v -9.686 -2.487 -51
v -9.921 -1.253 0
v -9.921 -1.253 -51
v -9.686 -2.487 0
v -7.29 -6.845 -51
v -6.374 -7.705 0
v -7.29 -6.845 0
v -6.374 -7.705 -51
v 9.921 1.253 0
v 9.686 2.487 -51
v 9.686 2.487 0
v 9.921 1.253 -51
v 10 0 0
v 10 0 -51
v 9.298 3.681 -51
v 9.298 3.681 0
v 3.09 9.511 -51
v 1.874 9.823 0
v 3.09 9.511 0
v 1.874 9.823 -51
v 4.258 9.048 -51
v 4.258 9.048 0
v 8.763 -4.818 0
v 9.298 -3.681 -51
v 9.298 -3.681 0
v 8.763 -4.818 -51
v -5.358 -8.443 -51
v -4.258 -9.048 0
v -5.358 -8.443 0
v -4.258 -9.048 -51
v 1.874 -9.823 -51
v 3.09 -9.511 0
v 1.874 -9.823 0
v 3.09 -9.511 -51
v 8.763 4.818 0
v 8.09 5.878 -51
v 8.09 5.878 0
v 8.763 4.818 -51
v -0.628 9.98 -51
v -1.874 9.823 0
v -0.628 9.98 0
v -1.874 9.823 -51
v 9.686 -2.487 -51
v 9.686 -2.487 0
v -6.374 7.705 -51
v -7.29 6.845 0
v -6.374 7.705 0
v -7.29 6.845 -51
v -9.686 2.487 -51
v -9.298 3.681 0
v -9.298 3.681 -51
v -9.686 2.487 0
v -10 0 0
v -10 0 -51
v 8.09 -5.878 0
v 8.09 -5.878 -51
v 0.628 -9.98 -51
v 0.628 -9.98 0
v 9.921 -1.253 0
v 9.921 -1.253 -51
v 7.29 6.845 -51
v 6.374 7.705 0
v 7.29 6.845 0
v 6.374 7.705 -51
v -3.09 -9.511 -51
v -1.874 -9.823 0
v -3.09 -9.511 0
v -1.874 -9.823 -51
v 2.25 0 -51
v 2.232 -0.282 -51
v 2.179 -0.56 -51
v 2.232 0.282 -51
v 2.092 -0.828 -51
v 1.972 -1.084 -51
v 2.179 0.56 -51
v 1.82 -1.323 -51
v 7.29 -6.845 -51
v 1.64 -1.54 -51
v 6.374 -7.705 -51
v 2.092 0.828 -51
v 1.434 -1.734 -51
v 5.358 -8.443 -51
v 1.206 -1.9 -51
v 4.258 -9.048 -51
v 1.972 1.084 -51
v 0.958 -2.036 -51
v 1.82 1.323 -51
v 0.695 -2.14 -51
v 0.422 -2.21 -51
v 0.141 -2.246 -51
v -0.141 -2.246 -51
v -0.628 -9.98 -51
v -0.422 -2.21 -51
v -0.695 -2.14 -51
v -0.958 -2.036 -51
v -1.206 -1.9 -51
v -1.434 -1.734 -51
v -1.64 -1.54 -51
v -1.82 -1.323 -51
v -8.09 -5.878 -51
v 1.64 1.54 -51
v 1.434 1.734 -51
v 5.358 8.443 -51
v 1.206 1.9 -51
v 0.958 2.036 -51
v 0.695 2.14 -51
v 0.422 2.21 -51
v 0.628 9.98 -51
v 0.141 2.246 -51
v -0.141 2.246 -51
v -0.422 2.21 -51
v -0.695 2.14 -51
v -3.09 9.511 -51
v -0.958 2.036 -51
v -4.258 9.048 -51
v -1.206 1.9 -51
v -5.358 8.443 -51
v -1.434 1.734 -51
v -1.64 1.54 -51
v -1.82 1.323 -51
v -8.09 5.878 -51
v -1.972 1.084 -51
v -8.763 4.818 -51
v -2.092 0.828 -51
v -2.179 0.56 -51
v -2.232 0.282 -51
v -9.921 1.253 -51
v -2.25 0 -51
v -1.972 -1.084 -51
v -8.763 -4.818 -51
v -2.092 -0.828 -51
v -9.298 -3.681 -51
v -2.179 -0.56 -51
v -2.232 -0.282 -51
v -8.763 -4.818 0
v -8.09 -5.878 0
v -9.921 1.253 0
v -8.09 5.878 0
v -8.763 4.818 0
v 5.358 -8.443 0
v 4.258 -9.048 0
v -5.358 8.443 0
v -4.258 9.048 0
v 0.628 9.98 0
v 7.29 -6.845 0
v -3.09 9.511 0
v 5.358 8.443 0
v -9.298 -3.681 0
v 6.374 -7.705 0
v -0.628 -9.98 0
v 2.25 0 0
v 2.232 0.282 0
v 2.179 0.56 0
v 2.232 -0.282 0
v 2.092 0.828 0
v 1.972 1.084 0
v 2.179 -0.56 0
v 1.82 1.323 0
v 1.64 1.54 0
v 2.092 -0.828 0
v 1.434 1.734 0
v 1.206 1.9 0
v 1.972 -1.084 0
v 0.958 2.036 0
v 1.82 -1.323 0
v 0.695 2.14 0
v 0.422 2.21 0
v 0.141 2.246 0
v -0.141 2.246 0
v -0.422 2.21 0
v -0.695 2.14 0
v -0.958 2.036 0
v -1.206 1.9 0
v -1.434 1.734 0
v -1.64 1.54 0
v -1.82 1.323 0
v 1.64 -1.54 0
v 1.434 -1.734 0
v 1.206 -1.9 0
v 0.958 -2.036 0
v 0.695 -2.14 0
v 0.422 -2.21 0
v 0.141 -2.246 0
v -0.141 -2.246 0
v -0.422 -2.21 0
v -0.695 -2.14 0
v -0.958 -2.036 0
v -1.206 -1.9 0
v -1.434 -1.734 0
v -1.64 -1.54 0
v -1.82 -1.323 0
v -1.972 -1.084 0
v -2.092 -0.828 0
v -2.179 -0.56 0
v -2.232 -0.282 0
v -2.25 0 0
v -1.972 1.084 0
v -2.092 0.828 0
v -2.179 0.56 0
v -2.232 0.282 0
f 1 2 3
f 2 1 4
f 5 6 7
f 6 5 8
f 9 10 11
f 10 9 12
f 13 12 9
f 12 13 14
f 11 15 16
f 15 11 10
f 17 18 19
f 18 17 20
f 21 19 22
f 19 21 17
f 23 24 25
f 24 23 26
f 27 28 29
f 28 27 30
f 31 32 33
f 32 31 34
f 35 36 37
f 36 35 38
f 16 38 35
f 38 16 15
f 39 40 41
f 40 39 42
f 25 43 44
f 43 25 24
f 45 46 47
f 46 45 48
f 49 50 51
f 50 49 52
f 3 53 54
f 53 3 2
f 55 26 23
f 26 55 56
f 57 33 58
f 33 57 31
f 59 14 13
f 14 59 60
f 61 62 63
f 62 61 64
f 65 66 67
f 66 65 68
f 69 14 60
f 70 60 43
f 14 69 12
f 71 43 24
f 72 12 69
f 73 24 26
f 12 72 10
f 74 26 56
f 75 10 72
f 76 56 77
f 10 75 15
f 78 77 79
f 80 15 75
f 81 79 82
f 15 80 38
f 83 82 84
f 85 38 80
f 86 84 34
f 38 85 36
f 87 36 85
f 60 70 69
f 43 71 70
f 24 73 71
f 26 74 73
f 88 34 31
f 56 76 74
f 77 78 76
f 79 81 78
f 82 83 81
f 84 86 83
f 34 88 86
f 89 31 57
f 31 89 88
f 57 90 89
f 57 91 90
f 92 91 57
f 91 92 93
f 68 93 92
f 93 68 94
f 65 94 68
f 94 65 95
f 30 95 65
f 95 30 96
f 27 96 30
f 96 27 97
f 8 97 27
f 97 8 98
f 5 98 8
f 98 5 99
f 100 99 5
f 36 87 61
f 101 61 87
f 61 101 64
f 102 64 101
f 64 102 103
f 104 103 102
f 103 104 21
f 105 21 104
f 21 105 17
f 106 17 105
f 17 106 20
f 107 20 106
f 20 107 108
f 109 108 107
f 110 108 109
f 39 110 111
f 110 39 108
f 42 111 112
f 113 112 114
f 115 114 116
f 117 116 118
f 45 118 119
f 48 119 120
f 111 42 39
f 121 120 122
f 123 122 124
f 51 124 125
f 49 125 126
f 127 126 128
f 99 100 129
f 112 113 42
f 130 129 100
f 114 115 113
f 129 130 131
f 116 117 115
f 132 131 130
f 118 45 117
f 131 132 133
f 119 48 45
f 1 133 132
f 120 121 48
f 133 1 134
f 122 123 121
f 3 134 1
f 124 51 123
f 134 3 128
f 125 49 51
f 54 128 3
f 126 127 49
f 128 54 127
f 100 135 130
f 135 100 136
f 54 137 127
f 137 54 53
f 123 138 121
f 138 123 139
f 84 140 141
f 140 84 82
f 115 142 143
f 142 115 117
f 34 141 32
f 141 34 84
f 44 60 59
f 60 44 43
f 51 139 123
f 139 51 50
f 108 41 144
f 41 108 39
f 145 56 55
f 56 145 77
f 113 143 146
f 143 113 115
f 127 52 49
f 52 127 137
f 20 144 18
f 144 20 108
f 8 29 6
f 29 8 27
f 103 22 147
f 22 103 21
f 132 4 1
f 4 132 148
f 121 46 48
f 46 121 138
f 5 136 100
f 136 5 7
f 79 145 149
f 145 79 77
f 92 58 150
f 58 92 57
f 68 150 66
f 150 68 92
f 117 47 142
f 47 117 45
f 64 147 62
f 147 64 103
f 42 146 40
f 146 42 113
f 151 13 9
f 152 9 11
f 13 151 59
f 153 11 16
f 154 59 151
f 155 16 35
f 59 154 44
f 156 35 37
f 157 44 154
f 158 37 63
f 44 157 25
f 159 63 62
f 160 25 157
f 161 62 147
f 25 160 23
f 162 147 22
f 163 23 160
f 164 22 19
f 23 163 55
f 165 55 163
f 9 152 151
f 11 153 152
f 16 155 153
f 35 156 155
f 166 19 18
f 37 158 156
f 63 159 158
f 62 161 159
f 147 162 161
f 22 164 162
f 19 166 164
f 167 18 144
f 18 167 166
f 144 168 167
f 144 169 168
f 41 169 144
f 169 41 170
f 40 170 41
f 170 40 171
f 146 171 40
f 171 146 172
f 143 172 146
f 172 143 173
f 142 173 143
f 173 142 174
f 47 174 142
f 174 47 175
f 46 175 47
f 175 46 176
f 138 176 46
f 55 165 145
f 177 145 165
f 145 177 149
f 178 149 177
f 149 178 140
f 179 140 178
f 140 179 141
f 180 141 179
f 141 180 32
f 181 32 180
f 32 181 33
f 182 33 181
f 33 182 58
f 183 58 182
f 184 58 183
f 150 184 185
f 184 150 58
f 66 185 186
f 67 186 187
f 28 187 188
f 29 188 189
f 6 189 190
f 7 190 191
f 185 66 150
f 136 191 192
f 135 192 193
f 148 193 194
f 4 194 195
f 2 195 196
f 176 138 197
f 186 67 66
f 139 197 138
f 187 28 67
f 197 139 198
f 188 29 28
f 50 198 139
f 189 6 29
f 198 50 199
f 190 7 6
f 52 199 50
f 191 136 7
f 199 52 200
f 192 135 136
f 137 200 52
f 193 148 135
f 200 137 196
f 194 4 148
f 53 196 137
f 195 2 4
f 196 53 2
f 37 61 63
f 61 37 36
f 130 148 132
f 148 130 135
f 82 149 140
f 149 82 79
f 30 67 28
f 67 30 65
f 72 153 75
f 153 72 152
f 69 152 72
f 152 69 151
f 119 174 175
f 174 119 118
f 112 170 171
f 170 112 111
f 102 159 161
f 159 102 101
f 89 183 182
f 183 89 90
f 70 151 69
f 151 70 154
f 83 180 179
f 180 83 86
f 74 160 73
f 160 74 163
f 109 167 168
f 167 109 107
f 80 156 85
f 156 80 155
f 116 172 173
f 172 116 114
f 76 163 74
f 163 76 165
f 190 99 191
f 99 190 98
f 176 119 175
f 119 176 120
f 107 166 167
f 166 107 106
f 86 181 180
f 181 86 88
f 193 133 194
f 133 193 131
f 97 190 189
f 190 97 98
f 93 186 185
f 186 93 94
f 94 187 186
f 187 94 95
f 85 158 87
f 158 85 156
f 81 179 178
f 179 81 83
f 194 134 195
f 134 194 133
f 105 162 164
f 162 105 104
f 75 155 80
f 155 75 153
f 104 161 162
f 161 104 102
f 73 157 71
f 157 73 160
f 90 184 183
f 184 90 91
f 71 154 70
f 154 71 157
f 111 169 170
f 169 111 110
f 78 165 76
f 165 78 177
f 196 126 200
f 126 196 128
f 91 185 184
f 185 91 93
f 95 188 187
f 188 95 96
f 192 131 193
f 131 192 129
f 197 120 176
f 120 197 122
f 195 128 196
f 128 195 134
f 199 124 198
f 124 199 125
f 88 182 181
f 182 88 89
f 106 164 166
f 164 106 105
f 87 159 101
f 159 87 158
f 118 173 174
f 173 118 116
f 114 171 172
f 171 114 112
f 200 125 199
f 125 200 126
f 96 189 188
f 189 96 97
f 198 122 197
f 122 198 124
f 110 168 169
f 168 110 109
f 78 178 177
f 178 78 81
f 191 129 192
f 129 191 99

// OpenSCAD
$fn = 50;


difference() {
	union() {
		translate(v = [0, 0, -51.0000000000]) {
			cylinder(h = 51, r = 10.0000000000);
		}
		cylinder(h = 0, r = 20.0000000000);
	}
	union() {
		#translate(v = [0, 0, -51]) {
			cylinder(h = 51, r = 2.2500000000);
		}
	}
}
